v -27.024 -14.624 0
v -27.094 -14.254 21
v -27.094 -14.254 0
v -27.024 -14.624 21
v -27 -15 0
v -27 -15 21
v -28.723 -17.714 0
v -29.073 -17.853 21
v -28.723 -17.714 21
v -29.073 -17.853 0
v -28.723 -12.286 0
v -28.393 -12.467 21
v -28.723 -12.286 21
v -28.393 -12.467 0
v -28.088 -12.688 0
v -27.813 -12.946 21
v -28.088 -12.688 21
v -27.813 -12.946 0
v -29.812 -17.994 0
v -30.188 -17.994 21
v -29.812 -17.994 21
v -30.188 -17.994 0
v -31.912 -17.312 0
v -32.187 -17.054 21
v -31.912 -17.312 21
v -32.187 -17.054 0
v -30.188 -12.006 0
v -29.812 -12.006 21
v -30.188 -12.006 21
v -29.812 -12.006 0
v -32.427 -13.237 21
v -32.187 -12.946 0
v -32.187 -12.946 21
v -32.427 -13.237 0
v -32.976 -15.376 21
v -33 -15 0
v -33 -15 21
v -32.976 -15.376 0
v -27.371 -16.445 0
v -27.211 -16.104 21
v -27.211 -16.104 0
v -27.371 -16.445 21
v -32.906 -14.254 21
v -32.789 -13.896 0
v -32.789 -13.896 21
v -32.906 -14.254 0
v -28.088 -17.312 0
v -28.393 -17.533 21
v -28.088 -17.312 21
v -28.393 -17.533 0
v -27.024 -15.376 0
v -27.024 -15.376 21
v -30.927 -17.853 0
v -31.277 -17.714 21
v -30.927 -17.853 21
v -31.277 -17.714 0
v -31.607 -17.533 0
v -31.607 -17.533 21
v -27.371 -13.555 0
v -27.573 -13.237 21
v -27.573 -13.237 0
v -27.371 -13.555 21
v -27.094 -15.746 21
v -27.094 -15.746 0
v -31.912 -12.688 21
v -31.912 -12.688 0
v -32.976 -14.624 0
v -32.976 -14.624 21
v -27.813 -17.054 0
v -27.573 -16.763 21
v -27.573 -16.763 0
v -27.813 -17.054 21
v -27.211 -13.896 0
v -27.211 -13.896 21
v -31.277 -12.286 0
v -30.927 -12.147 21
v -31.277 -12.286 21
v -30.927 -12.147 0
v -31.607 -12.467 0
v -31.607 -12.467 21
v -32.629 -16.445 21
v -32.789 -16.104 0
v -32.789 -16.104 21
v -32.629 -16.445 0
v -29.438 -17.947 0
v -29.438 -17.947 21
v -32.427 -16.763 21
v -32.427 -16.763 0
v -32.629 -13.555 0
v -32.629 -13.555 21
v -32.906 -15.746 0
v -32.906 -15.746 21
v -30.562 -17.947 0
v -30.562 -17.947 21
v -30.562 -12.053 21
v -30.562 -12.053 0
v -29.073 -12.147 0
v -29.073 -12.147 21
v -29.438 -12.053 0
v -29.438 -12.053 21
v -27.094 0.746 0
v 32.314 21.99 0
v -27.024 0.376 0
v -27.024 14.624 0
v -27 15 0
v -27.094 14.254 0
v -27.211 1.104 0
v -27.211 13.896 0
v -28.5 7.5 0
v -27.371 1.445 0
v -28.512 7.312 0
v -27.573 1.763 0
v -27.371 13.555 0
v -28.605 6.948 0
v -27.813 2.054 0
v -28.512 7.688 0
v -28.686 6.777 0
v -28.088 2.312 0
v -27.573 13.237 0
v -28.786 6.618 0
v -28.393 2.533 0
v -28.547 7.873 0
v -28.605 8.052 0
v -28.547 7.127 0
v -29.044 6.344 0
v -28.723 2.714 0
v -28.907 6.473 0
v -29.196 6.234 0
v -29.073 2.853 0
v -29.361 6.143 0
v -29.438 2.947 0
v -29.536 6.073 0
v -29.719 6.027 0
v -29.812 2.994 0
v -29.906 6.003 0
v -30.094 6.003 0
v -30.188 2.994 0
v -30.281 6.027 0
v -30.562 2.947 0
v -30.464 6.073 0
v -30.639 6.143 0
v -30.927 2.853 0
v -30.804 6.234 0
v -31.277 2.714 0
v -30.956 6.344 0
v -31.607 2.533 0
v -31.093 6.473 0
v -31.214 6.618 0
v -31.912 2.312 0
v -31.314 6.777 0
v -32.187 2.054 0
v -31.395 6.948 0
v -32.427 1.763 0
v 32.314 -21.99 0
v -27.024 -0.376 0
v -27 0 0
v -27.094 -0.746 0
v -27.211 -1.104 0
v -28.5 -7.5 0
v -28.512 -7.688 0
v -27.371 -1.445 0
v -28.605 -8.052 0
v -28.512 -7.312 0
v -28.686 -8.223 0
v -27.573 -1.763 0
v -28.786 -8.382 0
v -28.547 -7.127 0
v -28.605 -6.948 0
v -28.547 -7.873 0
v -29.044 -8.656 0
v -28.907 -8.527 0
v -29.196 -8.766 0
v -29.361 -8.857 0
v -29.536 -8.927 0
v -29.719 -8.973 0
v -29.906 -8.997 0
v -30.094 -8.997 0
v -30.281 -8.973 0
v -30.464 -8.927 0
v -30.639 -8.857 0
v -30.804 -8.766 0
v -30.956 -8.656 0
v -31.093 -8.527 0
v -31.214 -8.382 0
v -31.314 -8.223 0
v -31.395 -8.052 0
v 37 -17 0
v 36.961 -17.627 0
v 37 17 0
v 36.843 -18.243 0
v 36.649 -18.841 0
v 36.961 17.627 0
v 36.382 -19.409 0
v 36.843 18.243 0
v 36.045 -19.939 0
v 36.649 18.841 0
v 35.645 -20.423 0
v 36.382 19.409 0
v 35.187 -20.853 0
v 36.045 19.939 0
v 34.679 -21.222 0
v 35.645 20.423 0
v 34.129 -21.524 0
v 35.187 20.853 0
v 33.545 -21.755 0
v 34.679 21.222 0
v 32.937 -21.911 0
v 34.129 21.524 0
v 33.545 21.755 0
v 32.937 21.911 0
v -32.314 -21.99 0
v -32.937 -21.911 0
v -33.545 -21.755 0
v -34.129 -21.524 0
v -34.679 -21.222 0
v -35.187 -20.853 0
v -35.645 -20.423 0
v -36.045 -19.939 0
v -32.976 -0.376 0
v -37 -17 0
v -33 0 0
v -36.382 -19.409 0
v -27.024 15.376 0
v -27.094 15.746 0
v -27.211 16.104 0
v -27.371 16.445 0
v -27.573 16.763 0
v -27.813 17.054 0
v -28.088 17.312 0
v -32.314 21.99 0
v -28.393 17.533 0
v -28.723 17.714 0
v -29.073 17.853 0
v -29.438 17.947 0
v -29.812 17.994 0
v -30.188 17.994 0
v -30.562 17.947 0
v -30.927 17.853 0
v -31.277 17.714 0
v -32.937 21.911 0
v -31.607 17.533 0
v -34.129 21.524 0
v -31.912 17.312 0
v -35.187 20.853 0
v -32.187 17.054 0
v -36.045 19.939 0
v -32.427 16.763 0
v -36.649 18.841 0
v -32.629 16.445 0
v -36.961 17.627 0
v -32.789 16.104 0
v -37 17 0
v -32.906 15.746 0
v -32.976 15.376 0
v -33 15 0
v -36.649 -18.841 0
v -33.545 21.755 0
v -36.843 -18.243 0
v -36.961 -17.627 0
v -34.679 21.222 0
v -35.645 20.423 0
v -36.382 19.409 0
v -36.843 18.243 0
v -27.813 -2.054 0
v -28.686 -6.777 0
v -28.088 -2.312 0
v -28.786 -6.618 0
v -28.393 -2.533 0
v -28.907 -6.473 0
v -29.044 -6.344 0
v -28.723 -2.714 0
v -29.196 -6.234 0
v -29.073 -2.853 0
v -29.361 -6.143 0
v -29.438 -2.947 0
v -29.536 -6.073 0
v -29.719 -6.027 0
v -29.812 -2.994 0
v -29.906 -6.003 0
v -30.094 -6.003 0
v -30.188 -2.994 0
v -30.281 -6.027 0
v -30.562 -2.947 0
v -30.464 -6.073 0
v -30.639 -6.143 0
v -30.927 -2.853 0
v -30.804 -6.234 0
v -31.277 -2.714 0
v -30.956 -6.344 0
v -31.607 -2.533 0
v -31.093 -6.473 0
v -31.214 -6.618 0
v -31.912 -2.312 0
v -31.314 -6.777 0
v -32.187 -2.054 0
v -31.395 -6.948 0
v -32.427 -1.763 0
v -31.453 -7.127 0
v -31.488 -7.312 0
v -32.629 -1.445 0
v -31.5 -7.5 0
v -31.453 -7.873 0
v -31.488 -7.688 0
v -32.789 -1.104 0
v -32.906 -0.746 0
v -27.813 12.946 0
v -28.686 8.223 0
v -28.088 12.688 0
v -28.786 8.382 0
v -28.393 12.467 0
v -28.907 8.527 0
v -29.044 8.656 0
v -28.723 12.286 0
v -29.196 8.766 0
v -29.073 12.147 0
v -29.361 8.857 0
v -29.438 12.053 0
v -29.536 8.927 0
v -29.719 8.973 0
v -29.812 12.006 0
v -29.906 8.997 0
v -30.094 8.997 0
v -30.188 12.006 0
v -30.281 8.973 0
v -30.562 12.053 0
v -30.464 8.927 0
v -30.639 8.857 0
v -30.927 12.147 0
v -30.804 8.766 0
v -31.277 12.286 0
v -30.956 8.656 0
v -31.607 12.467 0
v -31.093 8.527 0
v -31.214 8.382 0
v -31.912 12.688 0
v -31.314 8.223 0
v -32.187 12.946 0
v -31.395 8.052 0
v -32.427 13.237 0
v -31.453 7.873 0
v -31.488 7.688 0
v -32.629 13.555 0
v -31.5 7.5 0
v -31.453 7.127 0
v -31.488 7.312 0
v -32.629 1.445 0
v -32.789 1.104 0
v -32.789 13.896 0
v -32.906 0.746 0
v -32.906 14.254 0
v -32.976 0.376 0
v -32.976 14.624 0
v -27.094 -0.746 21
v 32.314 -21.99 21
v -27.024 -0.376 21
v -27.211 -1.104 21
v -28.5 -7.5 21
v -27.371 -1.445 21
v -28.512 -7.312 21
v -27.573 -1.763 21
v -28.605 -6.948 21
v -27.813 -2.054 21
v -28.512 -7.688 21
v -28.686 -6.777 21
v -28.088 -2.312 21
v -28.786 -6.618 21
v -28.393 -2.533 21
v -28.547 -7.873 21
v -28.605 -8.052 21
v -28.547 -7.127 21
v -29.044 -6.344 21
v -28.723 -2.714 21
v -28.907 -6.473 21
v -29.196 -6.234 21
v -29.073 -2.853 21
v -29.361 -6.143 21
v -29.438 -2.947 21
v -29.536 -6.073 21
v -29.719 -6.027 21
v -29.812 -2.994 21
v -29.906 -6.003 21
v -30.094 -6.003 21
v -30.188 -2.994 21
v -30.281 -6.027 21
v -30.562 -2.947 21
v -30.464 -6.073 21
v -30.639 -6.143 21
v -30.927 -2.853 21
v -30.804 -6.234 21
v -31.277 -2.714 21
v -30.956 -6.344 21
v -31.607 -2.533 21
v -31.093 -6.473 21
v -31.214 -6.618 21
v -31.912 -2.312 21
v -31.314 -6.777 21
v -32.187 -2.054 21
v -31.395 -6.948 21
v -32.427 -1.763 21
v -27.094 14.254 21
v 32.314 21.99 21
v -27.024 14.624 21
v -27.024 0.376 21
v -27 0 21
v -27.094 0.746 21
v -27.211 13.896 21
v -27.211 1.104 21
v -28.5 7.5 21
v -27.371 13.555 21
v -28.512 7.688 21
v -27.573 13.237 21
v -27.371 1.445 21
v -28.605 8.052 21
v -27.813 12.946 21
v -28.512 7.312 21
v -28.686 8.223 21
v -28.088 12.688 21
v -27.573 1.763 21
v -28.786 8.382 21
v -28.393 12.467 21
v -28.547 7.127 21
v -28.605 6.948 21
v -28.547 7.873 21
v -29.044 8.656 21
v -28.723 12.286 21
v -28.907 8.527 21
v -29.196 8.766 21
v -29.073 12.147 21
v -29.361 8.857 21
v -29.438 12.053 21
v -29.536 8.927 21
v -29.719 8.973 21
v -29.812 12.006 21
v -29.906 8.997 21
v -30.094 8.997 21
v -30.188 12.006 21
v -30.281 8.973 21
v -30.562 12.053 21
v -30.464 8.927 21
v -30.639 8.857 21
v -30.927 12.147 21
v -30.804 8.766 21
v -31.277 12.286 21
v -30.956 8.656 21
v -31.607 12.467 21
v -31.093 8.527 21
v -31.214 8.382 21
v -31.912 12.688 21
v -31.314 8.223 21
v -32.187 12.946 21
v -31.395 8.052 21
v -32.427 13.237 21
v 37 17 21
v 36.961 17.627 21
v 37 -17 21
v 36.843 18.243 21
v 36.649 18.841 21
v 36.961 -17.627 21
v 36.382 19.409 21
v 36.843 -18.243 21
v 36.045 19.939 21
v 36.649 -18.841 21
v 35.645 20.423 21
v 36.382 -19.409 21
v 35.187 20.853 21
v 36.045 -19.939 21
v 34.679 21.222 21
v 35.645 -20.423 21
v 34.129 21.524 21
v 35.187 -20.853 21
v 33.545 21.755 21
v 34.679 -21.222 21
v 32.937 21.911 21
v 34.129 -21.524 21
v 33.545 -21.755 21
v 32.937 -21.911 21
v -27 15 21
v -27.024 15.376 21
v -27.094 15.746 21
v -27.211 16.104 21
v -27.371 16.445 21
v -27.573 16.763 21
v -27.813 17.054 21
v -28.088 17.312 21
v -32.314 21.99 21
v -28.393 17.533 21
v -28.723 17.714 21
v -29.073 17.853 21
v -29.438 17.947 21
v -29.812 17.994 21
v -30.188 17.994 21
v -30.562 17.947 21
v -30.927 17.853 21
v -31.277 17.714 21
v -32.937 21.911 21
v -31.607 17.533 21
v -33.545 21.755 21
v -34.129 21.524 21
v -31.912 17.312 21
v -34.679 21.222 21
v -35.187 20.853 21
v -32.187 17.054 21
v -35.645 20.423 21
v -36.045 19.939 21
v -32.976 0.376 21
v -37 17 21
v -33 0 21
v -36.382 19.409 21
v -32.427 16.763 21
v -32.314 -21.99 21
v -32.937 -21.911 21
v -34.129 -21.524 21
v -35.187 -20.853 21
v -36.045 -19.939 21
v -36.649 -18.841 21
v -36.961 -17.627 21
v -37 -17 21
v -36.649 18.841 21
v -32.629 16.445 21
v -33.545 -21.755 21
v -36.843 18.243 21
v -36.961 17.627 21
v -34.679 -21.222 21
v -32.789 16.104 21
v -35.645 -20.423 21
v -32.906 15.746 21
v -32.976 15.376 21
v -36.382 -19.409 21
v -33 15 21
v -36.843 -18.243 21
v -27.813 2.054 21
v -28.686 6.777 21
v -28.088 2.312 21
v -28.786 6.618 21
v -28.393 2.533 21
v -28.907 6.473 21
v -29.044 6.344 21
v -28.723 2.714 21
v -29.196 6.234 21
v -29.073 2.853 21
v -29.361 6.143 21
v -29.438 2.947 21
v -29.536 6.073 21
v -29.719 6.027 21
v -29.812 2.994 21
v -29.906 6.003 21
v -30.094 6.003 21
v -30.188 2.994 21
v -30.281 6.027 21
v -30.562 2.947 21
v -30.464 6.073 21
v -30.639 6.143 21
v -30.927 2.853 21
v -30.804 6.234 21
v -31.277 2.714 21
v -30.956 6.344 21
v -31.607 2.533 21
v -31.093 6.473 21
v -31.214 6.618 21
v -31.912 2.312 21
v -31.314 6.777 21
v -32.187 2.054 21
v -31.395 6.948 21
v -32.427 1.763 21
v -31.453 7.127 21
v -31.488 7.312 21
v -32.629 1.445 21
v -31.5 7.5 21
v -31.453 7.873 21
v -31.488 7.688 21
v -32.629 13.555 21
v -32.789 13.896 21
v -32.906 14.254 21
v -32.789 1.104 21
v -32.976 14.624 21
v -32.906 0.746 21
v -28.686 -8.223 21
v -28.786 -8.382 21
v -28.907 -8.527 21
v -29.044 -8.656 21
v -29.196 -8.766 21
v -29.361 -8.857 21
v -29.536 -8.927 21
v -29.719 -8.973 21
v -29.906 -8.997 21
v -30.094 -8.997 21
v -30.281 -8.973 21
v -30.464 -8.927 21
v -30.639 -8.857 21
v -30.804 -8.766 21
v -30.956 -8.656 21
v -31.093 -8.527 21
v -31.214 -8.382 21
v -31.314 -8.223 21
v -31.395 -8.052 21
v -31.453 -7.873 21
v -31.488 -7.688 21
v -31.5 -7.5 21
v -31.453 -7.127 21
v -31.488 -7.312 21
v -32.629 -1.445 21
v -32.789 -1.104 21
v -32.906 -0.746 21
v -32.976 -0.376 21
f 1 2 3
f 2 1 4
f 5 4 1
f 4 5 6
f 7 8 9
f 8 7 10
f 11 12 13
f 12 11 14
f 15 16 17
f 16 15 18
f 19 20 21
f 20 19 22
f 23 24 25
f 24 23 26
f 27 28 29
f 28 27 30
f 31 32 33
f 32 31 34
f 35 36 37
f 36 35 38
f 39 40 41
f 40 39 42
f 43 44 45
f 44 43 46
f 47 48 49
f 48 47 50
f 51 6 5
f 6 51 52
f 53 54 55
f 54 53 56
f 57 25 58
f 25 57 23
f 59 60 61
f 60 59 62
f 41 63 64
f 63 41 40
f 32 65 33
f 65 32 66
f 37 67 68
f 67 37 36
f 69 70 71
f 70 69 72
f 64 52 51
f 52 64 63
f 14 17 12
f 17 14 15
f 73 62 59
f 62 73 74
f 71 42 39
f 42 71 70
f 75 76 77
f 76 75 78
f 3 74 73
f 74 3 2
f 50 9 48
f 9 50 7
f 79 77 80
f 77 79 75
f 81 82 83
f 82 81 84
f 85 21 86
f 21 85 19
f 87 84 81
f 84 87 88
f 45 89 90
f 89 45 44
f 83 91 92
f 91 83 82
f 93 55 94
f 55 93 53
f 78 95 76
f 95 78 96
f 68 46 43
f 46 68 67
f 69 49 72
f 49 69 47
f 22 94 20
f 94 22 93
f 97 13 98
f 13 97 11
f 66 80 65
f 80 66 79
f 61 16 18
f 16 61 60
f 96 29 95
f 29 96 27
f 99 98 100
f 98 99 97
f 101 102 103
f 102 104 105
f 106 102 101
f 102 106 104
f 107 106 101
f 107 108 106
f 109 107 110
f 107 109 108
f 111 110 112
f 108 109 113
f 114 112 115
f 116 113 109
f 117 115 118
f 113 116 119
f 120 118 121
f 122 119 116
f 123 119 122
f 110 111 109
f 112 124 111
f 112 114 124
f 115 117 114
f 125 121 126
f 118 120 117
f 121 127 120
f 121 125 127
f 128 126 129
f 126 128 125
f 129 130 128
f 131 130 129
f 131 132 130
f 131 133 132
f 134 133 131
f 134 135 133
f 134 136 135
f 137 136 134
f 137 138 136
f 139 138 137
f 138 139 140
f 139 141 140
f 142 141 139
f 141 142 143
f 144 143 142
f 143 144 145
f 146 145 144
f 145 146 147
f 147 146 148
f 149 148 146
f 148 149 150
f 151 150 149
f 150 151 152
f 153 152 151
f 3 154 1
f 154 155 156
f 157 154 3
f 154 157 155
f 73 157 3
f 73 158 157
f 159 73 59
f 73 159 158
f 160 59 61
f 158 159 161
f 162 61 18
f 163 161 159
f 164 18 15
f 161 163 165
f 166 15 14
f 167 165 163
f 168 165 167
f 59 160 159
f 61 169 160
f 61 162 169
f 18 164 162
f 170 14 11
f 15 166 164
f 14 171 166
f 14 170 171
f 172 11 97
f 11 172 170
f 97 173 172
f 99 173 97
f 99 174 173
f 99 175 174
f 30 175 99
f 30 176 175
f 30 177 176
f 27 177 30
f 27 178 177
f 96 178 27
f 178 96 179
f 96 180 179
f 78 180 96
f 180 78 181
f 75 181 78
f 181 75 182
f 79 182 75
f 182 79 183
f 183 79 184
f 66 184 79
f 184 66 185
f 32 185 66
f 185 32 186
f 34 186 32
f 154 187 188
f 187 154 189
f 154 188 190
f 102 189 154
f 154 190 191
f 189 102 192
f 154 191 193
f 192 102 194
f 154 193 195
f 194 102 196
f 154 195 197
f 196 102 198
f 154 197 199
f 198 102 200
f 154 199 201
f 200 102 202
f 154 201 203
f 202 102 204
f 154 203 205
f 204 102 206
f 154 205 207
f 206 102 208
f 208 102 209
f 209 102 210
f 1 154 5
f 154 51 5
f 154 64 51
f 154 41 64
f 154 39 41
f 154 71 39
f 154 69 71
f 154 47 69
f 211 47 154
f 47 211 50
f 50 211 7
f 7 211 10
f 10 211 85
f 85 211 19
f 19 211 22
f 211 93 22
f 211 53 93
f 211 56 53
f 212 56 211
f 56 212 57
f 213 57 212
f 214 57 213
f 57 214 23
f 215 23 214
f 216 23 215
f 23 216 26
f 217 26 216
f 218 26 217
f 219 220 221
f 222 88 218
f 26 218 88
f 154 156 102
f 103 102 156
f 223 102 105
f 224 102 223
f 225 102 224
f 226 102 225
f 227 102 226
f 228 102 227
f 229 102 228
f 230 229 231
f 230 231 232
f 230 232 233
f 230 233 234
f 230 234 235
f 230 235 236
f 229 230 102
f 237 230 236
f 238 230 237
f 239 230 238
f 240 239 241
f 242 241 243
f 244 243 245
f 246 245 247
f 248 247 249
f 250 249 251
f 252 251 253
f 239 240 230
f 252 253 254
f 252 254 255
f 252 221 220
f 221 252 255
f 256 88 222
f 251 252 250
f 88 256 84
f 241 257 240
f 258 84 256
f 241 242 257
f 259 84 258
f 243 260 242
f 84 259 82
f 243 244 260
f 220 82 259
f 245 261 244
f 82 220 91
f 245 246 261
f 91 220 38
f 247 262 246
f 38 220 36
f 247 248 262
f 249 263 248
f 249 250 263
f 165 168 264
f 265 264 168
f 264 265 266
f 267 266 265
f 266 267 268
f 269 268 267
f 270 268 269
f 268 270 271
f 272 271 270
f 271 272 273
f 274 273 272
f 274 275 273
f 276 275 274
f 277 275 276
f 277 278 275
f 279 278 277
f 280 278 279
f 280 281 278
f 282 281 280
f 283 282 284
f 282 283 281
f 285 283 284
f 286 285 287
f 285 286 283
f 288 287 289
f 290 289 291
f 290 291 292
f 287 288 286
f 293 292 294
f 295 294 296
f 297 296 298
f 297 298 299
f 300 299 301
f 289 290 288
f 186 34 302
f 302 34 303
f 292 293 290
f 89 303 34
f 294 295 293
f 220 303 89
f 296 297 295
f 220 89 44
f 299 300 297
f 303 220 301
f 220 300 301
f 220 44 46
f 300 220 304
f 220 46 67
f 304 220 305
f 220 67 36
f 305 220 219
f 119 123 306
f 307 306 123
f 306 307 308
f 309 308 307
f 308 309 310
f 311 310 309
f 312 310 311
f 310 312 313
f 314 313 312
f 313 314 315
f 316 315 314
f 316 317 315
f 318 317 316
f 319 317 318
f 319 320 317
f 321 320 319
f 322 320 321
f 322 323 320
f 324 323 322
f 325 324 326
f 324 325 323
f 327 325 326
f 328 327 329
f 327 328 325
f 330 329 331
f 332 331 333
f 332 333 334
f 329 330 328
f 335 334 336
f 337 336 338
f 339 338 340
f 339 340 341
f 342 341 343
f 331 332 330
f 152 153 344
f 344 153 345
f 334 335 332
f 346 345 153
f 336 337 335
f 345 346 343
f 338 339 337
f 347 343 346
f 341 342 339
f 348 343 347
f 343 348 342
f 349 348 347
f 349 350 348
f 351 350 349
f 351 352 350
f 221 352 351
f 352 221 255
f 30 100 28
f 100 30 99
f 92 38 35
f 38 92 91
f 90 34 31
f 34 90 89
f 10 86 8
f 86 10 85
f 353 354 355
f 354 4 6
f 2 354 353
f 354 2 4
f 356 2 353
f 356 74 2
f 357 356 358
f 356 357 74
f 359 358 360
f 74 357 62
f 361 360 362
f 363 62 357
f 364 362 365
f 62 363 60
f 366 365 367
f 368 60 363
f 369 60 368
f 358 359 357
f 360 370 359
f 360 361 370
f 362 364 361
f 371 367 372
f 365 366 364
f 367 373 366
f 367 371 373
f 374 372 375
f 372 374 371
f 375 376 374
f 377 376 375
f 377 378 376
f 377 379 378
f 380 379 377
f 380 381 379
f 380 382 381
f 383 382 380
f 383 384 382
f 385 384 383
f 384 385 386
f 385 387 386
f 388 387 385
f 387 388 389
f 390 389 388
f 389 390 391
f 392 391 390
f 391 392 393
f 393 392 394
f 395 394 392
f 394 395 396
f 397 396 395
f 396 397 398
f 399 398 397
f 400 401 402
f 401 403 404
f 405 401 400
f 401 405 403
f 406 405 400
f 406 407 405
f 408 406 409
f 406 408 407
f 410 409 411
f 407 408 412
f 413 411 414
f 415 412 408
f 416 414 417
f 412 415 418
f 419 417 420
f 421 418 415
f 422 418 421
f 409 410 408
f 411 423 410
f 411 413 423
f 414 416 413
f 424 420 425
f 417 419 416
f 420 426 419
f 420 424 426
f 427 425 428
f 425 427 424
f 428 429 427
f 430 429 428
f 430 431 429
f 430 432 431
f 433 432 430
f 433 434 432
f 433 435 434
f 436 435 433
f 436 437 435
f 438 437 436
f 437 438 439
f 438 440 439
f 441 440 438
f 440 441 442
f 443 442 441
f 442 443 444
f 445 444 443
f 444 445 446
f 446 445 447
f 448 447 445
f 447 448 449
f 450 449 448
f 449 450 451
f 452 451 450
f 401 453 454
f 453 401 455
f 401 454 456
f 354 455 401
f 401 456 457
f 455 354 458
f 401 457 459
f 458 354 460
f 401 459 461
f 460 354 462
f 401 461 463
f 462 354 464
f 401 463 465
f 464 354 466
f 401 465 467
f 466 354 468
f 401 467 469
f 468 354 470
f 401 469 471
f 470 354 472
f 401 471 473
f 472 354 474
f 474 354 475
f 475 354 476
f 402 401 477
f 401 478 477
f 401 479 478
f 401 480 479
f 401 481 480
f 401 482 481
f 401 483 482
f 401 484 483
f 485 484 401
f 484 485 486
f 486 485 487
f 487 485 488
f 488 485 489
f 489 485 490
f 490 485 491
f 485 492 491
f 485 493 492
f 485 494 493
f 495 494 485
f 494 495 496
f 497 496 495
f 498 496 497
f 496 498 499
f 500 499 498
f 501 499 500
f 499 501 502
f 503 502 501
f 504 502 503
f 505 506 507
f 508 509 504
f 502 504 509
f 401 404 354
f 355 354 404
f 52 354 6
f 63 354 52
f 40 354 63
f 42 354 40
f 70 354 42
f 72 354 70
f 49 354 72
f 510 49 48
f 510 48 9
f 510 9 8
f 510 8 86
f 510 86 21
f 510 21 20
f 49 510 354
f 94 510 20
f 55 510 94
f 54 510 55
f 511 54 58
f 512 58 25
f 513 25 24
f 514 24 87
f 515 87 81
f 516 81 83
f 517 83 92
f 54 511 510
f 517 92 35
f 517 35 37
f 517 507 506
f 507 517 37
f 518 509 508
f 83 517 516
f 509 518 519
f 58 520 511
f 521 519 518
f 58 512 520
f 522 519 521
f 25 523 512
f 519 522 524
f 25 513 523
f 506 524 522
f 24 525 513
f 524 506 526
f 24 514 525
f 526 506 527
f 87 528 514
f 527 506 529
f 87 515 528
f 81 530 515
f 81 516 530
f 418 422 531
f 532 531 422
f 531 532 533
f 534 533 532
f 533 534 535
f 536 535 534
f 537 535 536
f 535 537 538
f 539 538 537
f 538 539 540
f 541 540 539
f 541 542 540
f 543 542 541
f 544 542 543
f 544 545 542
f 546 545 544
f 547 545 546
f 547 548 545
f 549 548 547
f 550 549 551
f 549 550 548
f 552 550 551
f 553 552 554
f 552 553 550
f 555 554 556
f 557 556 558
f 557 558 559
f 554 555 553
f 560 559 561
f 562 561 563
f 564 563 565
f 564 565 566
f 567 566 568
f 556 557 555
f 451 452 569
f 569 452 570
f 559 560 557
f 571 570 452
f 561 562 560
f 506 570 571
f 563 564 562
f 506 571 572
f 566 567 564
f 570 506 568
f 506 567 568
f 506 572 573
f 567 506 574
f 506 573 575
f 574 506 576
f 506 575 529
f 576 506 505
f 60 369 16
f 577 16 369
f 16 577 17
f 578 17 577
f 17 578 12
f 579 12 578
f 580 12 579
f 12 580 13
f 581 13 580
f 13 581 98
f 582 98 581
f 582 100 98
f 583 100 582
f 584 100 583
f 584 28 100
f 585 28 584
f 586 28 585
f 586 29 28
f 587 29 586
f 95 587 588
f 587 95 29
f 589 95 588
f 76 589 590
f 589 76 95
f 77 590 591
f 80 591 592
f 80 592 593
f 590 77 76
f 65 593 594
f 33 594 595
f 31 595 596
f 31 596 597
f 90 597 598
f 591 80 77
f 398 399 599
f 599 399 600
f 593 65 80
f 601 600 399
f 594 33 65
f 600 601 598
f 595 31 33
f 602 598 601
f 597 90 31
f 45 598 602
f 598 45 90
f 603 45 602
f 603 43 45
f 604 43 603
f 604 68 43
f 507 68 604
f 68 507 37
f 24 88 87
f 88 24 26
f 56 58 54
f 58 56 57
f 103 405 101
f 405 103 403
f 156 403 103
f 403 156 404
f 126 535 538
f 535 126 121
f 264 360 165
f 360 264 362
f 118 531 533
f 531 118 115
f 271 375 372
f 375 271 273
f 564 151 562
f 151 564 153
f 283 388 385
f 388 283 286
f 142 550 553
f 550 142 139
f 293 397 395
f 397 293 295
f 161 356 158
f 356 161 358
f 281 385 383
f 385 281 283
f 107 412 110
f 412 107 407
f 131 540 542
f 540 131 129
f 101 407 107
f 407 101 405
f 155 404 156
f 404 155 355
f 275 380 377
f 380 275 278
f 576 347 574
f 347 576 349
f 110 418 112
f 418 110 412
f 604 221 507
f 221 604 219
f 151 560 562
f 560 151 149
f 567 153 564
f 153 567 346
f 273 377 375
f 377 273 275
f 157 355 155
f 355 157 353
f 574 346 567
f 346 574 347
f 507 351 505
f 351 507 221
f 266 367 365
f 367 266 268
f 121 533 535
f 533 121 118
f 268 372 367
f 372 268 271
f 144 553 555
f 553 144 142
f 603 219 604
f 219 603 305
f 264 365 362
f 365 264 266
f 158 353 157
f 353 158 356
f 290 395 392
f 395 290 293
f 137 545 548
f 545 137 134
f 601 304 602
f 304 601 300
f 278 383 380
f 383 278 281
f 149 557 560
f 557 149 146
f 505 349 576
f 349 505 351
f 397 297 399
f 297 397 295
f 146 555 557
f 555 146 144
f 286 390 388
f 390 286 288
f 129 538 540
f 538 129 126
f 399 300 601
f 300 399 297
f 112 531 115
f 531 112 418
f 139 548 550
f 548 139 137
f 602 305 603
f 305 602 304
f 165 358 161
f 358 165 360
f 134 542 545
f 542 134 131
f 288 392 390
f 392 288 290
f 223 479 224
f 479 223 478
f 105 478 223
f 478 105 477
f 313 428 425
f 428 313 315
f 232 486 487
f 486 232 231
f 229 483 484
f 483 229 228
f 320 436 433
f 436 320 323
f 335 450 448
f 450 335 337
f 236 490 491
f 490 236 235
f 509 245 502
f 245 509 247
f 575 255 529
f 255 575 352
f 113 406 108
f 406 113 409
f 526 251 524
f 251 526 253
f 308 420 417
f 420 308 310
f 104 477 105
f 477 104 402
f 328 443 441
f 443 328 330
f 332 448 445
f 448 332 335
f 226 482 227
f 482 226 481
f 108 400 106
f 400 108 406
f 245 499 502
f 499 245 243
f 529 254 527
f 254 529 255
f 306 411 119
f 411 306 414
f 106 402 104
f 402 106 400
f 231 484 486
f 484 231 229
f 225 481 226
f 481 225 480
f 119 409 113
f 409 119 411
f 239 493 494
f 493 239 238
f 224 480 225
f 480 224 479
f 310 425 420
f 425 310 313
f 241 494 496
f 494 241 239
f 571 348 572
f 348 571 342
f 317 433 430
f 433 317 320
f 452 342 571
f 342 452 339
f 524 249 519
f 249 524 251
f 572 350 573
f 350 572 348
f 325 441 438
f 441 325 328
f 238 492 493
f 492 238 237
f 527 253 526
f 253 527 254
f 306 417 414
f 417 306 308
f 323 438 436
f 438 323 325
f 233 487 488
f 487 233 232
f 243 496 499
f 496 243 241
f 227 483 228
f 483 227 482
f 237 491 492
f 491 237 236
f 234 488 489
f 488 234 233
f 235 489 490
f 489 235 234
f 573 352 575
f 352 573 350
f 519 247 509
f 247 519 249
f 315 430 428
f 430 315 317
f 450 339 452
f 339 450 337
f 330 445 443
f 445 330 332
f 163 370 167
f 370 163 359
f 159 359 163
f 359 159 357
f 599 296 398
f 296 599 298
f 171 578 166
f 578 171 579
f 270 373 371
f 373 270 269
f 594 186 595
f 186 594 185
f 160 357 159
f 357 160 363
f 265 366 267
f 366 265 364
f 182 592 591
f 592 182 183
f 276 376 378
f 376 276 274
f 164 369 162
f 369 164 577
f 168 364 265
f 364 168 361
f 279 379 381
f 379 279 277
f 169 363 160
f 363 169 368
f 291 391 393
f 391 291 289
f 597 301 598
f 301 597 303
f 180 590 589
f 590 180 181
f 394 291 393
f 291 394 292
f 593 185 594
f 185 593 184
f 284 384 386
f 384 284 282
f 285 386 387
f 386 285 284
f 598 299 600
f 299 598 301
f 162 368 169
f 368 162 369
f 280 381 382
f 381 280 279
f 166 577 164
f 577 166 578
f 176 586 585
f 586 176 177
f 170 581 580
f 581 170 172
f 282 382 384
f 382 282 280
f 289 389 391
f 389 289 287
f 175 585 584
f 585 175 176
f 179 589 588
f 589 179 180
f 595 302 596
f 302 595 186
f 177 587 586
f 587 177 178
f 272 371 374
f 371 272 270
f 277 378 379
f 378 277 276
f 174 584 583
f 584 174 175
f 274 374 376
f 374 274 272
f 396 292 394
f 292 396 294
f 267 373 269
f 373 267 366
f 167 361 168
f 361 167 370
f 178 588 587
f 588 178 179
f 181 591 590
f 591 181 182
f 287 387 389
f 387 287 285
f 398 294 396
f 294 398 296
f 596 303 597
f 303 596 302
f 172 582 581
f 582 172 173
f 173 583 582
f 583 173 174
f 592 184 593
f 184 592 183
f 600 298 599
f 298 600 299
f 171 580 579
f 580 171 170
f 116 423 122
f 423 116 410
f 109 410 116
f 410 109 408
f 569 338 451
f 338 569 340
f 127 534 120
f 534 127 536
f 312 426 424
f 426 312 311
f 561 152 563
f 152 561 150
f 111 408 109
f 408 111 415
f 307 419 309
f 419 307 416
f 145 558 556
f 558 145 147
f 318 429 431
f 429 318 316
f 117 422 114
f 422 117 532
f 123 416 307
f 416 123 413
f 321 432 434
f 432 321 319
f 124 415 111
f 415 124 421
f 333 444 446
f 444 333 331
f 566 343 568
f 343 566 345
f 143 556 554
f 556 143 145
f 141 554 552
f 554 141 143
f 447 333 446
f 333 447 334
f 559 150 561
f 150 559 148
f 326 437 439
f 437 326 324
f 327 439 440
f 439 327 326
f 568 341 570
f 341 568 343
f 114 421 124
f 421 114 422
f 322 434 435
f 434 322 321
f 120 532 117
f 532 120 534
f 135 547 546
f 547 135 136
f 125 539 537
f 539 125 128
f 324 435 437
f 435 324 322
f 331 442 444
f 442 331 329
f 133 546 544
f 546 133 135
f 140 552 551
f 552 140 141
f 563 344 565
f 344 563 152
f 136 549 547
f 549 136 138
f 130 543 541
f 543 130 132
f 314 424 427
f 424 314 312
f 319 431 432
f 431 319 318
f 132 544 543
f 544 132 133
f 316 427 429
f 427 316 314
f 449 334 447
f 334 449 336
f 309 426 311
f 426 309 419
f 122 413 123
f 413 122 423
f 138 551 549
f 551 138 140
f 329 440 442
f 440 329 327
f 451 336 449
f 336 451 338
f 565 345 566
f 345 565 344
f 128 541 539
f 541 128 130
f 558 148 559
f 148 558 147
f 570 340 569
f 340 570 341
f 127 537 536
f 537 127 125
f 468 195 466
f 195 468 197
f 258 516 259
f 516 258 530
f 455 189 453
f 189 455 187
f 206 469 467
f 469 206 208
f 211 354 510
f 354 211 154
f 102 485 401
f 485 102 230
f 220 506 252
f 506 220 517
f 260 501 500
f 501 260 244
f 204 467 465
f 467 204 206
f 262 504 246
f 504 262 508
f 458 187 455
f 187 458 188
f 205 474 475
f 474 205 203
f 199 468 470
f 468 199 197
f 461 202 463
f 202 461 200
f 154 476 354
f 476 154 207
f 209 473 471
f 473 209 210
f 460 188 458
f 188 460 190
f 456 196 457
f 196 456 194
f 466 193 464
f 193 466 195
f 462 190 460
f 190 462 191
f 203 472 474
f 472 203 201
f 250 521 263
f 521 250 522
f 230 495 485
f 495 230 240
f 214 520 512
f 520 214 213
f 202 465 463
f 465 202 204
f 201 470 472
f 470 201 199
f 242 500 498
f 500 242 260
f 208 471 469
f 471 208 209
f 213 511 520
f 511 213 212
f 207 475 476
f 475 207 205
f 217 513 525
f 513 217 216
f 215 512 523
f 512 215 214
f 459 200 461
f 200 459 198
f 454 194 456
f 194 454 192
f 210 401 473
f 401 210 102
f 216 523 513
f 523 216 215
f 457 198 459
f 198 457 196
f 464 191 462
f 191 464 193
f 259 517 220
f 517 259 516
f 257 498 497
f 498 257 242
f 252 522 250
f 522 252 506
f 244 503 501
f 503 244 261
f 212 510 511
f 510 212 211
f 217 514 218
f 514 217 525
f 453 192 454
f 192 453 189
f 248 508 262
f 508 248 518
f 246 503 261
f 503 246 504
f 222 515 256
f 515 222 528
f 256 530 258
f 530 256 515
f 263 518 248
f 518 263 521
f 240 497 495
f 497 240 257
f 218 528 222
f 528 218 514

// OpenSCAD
$fn = 50;


difference() {
	union() {
		hull() {
			translate(v = [-32.0000000000, 17.0000000000, 0]) {
				cylinder(h = 21, r = 5);
			}
			translate(v = [32.0000000000, 17.0000000000, 0]) {
				cylinder(h = 21, r = 5);
			}
			translate(v = [-32.0000000000, -17.0000000000, 0]) {
				cylinder(h = 21, r = 5);
			}
			translate(v = [32.0000000000, -17.0000000000, 0]) {
				cylinder(h = 21, r = 5);
			}
		}
	}
	union() {
		translate(v = [-30.0000000000, -15.0000000000, 0]) {
			cylinder(h = 21, r = 3.0000000000);
		}
		translate(v = [-30.0000000000, 0.0000000000, 0]) {
			cylinder(h = 21, r = 3.0000000000);
		}
		translate(v = [-30.0000000000, 15.0000000000, 0]) {
			cylinder(h = 21, r = 3.0000000000);
		}
		translate(v = [-30.0000000000, -15.0000000000, 0]) {
			cylinder(h = 21, r = 1.5000000000);
		}
		translate(v = [-30.0000000000, -7.5000000000, 0]) {
			cylinder(h = 21, r = 1.5000000000);
		}
		translate(v = [-30.0000000000, 0.0000000000, 0]) {
			cylinder(h = 21, r = 1.5000000000);
		}
		translate(v = [-30.0000000000, 7.5000000000, 0]) {
			cylinder(h = 21, r = 1.5000000000);
		}
		translate(v = [-30.0000000000, 15.0000000000, 0]) {
			cylinder(h = 21, r = 1.5000000000);
		}
		translate(v = [-30.0000000000, -15.0000000000, 0]) {
			cylinder(h = 21, r = 1.5000000000);
		}
		translate(v = [-30.0000000000, -7.5000000000, 0]) {
			cylinder(h = 21, r = 1.5000000000);
		}
		translate(v = [-30.0000000000, 0.0000000000, 0]) {
			cylinder(h = 21, r = 1.5000000000);
		}
		translate(v = [-30.0000000000, 7.5000000000, 0]) {
			cylinder(h = 21, r = 1.5000000000);
		}
		translate(v = [-30.0000000000, 15.0000000000, 0]) {
			cylinder(h = 21, r = 1.5000000000);
		}
		translate(v = [-30.0000000000, -15.0000000000, 0]) {
			cylinder(h = 21, r = 1.5000000000);
		}
		translate(v = [-30.0000000000, -7.5000000000, 0]) {
			cylinder(h = 21, r = 1.5000000000);
		}
		translate(v = [-30.0000000000, 0.0000000000, 0]) {
			cylinder(h = 21, r = 1.5000000000);
		}
		translate(v = [-30.0000000000, 7.5000000000, 0]) {
			cylinder(h = 21, r = 1.5000000000);
		}
		translate(v = [-30.0000000000, 15.0000000000, 0]) {
			cylinder(h = 21, r = 1.5000000000);
		}
	}
}
